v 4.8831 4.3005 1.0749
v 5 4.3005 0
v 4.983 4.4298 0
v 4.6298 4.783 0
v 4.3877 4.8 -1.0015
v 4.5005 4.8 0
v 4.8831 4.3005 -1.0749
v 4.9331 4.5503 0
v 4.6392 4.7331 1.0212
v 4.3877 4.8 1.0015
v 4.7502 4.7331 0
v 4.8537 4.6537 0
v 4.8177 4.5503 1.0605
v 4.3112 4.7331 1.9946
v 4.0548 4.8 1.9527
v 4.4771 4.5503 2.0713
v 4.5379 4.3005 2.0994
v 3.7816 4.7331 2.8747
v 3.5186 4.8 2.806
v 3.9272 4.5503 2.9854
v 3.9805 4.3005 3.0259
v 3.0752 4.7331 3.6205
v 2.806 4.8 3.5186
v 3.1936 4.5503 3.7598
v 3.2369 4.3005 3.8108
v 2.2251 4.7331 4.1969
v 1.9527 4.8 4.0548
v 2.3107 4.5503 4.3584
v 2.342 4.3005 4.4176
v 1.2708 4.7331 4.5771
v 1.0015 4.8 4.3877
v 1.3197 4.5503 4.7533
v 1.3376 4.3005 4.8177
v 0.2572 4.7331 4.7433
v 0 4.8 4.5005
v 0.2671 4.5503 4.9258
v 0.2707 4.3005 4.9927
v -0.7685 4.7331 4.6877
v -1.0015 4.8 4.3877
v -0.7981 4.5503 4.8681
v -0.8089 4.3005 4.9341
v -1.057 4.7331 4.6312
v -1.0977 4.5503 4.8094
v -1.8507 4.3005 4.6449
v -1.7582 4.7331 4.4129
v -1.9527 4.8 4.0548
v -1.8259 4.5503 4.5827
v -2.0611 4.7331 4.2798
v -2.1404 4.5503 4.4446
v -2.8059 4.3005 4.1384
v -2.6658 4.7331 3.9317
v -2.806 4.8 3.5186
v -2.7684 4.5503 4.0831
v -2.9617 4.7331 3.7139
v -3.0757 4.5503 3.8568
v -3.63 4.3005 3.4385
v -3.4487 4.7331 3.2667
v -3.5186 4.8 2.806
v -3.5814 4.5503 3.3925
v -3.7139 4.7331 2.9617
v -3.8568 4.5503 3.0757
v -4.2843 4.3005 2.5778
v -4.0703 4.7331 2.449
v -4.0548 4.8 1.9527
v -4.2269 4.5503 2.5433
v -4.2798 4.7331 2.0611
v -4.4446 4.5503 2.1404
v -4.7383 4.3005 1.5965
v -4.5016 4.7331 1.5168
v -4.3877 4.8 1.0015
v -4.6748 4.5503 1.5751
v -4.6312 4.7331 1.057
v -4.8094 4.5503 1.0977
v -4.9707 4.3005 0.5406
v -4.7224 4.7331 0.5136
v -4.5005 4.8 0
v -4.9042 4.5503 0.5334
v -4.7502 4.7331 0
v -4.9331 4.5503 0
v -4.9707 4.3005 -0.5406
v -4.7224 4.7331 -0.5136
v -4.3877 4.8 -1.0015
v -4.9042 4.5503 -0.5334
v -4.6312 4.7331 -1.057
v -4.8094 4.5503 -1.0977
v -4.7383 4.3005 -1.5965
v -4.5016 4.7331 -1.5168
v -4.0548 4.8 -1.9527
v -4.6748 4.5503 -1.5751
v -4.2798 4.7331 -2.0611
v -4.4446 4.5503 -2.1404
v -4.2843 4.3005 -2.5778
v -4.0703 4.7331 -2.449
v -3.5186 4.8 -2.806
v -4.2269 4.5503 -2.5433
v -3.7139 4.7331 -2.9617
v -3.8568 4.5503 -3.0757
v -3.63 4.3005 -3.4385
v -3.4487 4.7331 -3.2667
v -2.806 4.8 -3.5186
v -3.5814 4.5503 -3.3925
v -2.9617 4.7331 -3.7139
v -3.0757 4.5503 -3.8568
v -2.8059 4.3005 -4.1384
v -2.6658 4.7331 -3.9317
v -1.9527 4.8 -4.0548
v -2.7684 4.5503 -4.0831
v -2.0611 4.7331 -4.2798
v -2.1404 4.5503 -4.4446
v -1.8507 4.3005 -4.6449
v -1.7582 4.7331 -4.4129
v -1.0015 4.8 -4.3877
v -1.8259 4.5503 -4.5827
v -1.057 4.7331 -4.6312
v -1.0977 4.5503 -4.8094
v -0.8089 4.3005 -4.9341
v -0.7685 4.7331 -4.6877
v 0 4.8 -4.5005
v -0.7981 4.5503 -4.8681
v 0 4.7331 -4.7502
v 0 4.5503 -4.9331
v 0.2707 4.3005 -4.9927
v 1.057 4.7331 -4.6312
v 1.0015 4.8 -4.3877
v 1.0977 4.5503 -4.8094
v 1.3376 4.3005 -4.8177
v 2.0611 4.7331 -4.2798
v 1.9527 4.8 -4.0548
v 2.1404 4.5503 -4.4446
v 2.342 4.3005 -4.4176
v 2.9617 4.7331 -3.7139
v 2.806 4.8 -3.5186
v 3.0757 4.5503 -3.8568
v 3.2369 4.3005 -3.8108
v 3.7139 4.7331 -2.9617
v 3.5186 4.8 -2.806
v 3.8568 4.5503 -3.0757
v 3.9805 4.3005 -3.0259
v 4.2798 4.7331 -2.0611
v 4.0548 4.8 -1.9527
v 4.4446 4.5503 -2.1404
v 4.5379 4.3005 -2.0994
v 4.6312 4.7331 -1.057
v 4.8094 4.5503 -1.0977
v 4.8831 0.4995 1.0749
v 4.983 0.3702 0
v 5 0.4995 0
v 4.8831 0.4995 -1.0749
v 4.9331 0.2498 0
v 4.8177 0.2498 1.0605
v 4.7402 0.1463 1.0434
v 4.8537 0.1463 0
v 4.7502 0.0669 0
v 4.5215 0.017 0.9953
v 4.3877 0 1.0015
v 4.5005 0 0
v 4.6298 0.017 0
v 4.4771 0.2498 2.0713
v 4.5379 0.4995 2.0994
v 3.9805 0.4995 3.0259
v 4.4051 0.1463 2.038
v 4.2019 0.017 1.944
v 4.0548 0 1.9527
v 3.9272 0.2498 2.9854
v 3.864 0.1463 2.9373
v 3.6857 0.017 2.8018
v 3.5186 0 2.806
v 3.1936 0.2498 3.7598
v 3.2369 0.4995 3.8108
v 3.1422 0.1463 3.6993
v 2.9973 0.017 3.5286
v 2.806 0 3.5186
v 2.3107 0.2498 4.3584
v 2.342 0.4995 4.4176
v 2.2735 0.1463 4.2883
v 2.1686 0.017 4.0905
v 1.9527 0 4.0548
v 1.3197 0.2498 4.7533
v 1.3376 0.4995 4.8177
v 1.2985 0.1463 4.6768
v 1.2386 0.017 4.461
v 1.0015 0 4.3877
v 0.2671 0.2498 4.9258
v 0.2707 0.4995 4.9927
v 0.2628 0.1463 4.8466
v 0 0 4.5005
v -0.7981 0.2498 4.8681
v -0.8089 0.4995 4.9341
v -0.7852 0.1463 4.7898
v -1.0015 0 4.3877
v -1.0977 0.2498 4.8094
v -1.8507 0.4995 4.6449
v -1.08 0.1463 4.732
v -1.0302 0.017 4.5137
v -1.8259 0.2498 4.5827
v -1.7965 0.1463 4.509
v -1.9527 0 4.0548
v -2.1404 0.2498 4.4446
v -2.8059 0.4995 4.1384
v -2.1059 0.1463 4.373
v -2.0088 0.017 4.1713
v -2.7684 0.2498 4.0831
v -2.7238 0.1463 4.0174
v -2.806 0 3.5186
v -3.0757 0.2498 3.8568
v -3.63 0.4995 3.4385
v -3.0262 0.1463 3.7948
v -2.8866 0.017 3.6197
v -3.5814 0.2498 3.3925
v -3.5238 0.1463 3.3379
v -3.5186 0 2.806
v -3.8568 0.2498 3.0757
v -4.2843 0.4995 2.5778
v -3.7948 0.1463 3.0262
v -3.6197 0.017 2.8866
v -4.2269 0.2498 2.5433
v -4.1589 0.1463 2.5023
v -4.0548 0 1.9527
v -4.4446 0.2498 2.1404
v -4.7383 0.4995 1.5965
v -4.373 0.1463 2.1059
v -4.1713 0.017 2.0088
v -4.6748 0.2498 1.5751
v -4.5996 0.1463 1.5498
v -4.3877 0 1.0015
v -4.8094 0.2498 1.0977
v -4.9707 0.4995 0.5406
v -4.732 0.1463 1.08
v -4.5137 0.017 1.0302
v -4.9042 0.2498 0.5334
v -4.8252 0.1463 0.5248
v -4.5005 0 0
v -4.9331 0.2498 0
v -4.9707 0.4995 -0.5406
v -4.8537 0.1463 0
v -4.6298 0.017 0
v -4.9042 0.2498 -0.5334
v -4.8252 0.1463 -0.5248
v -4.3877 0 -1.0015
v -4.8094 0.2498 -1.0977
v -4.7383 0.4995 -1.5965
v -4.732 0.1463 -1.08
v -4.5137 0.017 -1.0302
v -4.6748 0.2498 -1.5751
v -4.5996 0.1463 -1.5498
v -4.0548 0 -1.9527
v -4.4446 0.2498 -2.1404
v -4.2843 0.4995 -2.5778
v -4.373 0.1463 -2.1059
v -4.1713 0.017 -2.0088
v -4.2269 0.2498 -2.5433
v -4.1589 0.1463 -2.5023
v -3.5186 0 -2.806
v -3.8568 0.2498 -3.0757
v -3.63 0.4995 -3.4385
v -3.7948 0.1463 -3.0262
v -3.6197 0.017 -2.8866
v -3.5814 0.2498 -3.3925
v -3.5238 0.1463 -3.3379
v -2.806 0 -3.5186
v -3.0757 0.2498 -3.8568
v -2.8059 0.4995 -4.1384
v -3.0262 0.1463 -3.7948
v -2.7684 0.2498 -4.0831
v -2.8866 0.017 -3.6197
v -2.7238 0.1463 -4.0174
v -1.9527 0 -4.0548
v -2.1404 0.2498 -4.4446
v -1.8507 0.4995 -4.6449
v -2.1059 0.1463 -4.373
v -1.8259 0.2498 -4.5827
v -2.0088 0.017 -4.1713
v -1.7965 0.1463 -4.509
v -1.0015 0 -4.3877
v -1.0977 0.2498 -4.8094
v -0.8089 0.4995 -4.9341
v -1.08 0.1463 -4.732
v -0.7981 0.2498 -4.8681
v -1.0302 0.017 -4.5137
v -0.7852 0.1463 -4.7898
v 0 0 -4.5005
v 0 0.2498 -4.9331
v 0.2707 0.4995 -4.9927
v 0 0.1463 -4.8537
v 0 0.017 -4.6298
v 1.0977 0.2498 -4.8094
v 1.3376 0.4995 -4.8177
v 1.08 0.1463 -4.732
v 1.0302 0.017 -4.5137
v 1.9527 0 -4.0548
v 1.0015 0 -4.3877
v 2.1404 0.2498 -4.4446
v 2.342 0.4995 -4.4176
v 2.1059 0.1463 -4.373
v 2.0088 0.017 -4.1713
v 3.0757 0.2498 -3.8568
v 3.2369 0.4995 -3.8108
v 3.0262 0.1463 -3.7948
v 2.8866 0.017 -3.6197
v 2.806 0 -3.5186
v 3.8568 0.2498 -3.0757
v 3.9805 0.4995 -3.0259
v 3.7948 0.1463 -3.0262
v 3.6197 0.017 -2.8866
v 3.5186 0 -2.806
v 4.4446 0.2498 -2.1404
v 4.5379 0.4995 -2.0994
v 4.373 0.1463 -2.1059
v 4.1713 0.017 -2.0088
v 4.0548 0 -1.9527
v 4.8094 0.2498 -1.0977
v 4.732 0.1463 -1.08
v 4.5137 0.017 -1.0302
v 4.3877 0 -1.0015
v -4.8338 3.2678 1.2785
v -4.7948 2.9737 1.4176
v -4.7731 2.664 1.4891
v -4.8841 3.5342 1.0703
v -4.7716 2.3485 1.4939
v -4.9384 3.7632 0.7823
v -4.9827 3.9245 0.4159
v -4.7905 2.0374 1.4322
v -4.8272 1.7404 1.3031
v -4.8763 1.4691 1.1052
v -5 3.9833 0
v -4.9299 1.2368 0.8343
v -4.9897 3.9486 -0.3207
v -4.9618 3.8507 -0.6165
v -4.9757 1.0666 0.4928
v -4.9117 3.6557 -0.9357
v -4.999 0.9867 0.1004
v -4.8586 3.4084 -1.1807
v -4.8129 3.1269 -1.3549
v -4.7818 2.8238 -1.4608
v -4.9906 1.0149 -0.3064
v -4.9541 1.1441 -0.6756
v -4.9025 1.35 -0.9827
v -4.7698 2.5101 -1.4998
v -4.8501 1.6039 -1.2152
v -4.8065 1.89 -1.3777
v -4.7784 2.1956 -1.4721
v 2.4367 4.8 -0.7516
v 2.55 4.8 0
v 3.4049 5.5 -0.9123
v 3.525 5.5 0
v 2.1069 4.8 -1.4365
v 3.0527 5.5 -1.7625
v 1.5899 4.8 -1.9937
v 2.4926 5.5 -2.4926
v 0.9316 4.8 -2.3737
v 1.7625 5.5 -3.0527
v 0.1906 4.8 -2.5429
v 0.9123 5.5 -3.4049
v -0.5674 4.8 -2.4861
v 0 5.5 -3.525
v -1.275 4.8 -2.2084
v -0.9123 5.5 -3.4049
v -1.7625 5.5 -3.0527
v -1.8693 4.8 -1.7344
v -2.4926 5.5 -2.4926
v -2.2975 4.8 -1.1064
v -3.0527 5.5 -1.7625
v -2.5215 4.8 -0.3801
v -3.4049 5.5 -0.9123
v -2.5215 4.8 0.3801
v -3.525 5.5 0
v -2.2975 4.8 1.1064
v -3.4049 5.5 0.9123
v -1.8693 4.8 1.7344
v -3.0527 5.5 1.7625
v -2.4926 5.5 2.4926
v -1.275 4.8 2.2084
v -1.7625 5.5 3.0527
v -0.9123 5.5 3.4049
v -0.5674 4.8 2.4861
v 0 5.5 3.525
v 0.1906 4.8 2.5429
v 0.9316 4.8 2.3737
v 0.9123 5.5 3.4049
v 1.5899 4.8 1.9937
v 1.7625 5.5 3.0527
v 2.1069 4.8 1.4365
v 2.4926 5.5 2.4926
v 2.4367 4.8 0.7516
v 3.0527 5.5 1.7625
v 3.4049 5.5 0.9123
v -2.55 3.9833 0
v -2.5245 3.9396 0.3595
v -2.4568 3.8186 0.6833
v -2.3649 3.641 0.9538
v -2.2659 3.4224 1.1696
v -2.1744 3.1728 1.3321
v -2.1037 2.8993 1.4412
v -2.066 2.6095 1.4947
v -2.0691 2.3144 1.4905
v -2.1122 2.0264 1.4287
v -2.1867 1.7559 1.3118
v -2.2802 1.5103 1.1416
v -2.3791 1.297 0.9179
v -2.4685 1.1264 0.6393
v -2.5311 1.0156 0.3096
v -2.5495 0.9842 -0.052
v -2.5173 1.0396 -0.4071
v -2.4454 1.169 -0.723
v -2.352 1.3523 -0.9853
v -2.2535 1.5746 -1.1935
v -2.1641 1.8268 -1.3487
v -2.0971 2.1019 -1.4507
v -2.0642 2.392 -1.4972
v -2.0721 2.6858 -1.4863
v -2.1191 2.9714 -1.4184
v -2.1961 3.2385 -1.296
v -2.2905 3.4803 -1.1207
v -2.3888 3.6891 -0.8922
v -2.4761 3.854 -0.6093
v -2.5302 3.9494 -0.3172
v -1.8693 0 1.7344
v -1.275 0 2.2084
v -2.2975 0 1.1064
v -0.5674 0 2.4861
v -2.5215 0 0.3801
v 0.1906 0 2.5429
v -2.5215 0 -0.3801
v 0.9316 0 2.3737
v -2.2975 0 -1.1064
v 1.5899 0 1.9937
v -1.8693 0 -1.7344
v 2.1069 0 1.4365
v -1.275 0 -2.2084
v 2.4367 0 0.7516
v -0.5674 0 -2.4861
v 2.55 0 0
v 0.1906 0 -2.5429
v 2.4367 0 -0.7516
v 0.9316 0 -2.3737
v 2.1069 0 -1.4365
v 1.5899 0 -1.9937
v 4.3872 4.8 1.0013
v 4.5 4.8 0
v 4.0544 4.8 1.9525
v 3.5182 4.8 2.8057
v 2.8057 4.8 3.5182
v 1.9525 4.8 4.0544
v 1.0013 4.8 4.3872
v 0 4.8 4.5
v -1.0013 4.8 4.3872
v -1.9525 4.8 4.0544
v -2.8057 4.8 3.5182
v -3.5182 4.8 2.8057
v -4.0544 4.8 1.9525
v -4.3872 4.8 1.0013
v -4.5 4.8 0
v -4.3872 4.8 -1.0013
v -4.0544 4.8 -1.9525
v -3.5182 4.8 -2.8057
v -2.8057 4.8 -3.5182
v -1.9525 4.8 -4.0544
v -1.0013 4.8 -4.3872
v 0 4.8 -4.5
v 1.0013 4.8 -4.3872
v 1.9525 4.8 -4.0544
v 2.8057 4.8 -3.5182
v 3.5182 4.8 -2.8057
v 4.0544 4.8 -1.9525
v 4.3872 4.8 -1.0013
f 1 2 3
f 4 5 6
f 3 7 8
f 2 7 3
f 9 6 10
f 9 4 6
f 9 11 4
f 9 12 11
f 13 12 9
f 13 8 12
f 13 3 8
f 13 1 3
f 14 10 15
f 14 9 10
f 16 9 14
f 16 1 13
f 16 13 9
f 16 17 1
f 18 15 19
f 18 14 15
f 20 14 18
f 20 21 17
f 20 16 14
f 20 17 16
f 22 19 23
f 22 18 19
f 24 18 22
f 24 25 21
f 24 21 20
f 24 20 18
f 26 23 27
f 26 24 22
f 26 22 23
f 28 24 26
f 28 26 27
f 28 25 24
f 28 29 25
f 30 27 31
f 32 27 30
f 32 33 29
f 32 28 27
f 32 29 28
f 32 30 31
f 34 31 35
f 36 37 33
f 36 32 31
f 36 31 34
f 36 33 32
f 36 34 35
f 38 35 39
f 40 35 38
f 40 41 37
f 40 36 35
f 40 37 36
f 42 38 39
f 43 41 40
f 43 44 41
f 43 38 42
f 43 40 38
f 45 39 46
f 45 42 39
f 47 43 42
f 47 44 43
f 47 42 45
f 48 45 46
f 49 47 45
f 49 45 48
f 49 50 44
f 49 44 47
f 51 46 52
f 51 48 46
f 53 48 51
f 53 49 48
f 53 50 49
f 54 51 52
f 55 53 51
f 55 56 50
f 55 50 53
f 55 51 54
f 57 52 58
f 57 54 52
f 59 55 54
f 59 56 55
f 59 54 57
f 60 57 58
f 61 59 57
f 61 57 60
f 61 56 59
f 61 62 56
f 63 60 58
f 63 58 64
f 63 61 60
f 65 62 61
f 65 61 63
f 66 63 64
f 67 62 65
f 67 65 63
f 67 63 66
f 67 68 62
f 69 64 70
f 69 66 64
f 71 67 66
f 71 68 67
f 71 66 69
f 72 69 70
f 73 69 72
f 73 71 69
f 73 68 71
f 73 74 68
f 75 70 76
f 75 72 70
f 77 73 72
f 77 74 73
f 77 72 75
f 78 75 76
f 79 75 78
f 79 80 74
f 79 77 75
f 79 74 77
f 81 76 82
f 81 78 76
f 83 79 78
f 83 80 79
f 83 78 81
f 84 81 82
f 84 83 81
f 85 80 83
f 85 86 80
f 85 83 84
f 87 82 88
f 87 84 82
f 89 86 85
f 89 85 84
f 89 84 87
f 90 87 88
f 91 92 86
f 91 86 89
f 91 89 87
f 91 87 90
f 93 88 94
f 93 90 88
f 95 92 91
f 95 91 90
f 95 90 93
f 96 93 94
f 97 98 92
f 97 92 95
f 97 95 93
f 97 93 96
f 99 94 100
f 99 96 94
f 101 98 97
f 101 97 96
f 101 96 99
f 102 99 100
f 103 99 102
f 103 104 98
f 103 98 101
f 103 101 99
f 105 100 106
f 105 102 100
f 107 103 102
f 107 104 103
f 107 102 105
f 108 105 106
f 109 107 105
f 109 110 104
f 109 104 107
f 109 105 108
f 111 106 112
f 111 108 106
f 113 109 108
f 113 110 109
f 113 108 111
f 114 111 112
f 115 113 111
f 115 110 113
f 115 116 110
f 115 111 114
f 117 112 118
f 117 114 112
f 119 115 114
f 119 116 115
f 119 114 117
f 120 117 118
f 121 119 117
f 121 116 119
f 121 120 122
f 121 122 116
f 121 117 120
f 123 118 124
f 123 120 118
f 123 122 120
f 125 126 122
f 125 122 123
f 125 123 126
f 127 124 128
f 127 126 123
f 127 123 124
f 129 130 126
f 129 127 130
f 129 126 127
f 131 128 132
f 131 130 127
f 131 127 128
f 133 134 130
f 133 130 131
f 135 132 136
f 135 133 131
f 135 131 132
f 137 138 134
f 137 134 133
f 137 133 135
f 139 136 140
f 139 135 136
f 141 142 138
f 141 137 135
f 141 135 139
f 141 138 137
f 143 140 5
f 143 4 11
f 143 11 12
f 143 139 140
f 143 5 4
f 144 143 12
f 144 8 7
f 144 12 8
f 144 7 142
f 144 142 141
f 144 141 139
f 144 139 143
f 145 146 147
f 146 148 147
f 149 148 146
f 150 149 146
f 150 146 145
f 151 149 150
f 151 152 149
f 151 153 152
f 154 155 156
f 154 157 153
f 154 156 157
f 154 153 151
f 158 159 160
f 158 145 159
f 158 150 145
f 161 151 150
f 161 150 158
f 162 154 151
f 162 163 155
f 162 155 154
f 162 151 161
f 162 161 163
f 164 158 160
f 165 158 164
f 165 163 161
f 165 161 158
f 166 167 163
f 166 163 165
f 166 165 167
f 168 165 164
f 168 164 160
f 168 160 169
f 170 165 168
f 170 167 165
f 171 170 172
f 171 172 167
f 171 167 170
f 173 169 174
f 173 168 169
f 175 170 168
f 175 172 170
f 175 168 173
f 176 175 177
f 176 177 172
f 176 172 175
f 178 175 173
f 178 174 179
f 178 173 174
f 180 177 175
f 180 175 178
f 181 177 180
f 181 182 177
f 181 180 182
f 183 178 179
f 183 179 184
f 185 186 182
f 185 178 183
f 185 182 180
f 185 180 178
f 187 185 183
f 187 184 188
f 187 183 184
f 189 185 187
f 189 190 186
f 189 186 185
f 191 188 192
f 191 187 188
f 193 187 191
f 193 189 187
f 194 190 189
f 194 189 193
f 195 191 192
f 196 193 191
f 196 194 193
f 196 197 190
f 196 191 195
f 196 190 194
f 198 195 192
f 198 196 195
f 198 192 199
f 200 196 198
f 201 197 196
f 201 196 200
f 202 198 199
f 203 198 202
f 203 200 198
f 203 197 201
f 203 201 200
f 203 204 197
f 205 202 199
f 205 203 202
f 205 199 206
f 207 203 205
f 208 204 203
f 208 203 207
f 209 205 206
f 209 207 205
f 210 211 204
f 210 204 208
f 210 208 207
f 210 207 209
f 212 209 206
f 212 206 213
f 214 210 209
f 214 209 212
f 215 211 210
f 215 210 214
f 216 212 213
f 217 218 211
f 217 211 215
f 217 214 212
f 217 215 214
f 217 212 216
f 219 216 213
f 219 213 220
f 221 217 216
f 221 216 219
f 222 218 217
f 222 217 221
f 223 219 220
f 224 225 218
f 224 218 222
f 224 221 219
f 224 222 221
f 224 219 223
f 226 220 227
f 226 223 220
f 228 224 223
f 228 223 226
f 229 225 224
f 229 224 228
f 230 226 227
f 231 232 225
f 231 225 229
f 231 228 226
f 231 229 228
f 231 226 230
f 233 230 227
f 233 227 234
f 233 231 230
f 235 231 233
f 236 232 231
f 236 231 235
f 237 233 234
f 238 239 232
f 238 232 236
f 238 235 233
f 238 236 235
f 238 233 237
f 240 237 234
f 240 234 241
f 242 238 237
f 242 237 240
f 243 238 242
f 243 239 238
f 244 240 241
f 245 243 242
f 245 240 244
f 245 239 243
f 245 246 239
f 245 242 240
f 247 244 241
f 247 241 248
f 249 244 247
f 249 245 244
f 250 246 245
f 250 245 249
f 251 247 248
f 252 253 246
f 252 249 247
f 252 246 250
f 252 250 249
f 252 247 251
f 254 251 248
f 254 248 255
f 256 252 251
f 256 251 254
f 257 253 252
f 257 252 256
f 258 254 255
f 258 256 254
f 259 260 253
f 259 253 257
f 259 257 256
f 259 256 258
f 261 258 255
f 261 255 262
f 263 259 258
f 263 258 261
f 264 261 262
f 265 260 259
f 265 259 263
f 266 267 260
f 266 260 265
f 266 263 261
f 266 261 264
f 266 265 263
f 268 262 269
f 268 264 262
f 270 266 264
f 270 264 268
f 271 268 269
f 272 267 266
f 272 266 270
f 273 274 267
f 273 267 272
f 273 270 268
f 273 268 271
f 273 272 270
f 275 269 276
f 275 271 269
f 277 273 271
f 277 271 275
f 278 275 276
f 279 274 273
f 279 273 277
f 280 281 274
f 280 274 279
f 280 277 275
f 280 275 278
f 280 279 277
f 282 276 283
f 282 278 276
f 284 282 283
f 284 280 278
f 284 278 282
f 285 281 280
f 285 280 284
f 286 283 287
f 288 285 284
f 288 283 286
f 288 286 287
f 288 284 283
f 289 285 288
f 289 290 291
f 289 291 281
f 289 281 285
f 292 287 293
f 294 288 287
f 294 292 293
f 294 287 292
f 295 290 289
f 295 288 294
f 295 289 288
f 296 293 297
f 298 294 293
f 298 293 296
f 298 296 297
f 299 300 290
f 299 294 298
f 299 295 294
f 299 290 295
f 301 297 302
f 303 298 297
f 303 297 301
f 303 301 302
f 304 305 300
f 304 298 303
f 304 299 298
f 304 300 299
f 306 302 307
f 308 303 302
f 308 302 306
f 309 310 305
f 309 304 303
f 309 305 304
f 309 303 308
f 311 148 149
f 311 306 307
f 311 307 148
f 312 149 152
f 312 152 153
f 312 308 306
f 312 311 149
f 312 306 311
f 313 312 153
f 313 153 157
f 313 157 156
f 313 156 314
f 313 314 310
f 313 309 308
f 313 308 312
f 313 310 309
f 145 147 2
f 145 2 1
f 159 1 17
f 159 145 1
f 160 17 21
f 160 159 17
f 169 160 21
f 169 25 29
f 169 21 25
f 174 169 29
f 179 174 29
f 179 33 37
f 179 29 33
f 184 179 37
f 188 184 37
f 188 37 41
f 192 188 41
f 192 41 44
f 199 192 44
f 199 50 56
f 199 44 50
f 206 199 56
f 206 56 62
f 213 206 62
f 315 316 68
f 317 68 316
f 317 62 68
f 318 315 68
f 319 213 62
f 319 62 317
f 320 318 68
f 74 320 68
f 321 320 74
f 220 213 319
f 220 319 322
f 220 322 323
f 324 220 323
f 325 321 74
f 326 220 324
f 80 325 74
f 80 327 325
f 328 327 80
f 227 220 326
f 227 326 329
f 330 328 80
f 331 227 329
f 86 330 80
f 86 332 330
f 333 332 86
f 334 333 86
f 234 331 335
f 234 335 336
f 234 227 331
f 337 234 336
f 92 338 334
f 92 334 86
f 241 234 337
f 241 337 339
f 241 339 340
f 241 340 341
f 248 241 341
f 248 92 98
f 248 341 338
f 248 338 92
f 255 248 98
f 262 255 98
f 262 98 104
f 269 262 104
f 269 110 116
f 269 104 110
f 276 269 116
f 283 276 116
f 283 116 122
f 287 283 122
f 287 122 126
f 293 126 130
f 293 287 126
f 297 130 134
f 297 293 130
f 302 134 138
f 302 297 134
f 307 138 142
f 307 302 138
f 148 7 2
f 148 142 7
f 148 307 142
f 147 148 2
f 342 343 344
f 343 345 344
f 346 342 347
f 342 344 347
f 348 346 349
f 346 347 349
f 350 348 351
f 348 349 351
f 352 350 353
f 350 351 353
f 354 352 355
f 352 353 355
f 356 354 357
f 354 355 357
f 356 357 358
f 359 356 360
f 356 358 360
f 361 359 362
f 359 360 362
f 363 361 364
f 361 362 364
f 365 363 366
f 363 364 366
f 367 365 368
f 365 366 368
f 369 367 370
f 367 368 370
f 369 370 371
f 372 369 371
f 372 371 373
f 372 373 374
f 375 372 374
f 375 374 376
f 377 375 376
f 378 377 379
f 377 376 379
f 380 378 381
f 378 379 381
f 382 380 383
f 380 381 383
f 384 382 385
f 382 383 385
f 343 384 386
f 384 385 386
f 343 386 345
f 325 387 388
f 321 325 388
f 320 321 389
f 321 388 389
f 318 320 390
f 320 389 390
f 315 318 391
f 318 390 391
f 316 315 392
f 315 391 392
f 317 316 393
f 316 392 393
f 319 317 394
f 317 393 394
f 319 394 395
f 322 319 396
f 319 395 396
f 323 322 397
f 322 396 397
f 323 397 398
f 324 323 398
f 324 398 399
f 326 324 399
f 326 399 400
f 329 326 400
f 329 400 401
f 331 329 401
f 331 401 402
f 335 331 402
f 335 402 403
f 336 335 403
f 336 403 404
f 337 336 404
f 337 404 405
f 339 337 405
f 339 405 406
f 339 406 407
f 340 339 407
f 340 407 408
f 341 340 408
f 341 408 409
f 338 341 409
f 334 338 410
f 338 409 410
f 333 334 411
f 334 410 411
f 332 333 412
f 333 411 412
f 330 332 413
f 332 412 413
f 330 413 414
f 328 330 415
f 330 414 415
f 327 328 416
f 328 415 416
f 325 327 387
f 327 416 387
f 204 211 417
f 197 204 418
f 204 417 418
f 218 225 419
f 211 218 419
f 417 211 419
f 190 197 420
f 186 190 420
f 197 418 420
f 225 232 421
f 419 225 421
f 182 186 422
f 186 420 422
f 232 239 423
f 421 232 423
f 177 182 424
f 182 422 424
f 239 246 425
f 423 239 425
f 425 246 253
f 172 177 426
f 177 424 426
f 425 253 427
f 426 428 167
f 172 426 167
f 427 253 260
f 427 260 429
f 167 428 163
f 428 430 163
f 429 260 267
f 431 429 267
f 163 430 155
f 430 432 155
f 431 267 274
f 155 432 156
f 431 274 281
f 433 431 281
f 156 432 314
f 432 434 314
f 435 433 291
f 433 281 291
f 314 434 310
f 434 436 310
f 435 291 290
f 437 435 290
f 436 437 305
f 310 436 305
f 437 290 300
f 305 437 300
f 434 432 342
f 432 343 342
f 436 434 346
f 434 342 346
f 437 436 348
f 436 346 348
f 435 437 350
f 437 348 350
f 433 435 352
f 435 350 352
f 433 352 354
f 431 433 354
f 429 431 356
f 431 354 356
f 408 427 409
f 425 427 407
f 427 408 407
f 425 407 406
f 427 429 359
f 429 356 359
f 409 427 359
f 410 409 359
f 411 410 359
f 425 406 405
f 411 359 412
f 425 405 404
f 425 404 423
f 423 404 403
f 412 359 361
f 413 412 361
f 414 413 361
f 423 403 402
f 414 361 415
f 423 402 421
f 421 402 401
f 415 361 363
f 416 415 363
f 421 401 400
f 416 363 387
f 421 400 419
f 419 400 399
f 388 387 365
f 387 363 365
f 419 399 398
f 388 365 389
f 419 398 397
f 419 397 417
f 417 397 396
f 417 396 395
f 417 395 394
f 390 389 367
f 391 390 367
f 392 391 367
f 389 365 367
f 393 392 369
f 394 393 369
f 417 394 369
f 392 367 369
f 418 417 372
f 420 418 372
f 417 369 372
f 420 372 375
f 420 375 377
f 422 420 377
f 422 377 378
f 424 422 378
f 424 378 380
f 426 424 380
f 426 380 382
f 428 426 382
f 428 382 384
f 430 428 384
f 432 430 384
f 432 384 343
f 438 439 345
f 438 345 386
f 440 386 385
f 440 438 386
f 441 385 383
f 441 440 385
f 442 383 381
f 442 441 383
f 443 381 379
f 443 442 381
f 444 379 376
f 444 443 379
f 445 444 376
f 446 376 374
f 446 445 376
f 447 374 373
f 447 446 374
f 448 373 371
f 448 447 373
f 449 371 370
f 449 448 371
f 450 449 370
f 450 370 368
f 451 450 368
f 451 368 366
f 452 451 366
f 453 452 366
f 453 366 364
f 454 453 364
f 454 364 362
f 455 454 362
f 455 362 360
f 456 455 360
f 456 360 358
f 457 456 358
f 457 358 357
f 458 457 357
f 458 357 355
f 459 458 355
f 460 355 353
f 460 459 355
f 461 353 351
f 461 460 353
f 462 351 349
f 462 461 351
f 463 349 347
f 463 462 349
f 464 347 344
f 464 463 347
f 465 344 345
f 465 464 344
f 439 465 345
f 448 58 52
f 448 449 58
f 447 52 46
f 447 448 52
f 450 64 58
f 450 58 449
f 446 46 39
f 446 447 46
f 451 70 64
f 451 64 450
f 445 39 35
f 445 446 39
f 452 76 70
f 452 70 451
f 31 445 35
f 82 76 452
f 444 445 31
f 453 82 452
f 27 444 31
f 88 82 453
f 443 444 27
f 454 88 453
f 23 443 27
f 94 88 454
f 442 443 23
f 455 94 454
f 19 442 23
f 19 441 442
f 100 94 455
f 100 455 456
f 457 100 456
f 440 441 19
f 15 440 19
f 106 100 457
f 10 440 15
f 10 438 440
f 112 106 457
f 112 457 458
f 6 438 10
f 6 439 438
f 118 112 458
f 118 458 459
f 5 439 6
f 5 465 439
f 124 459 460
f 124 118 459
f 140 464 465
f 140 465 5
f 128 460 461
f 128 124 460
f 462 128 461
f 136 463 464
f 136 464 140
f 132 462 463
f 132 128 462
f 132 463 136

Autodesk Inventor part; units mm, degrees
ref_plane "YZ Plane" through (0, 0, 0) normal (1, 0, 0) x (0, 1, 0)
ref_plane "XZ Plane" through (0, 0, 0) normal (0, 1, 0) x (-1, 0, 0)
ref_plane "XY Plane" through (0, 0, 0) normal (0, 0, 1) x (1, 0, 0)
sketch "Sketch1" plane through (0, 0, 0) normal (0, 0, 1) x (1, 0, 0)
  line L0 (2.55, 4.8) -> (3.525, 5.5)
  line L1 (3.525, 5.5) -> (4.5, 4.8)
  line L2 (4.5, 4.8) -> (5, 4.8)
  line L3 (5, 4.8) -> (5, 0)
  line L4 (5, 0) -> (2.55, 0)
  line L5 (2.55, 0) -> (2.55, 4.8)
  line L6 (0, 0) -> (0, 15.358) construction
  line L7 (2.55, 4.8) -> (4.5, 4.8) construction
  point P0 (3.775, 0)
  dimension "d0" = 2.55
  dimension "d1" = 5
  dimension "d2" = 5.5
  dimension "d4" = 4.8
  dimension "d5" = 0.5
revolve "Revolution1" add sketch "Sketch1" angle 360 about axis through (0, 0, 0) along (0, 1, 0)
fillet "Fillet1" radius 0.5 2 edges at (-5, 4.8, 0) (-5, 0, 0)
sketch "Sketch2" plane through (0, 0, 0) normal (1, 0, 0) x (0, 1, 0)
  circle A0 centre (2.4833, 0) radius 1.5
  point P0 (0, 0)
  dimension "d8" = 3
extrude "Extrusion1" cut sketch "Sketch2" against normal blind 10
thread "Thread1" size "M3x0.5" class "6H" standard "ANSI Metric M Profile" full length
properties part number "5mm Collar"
